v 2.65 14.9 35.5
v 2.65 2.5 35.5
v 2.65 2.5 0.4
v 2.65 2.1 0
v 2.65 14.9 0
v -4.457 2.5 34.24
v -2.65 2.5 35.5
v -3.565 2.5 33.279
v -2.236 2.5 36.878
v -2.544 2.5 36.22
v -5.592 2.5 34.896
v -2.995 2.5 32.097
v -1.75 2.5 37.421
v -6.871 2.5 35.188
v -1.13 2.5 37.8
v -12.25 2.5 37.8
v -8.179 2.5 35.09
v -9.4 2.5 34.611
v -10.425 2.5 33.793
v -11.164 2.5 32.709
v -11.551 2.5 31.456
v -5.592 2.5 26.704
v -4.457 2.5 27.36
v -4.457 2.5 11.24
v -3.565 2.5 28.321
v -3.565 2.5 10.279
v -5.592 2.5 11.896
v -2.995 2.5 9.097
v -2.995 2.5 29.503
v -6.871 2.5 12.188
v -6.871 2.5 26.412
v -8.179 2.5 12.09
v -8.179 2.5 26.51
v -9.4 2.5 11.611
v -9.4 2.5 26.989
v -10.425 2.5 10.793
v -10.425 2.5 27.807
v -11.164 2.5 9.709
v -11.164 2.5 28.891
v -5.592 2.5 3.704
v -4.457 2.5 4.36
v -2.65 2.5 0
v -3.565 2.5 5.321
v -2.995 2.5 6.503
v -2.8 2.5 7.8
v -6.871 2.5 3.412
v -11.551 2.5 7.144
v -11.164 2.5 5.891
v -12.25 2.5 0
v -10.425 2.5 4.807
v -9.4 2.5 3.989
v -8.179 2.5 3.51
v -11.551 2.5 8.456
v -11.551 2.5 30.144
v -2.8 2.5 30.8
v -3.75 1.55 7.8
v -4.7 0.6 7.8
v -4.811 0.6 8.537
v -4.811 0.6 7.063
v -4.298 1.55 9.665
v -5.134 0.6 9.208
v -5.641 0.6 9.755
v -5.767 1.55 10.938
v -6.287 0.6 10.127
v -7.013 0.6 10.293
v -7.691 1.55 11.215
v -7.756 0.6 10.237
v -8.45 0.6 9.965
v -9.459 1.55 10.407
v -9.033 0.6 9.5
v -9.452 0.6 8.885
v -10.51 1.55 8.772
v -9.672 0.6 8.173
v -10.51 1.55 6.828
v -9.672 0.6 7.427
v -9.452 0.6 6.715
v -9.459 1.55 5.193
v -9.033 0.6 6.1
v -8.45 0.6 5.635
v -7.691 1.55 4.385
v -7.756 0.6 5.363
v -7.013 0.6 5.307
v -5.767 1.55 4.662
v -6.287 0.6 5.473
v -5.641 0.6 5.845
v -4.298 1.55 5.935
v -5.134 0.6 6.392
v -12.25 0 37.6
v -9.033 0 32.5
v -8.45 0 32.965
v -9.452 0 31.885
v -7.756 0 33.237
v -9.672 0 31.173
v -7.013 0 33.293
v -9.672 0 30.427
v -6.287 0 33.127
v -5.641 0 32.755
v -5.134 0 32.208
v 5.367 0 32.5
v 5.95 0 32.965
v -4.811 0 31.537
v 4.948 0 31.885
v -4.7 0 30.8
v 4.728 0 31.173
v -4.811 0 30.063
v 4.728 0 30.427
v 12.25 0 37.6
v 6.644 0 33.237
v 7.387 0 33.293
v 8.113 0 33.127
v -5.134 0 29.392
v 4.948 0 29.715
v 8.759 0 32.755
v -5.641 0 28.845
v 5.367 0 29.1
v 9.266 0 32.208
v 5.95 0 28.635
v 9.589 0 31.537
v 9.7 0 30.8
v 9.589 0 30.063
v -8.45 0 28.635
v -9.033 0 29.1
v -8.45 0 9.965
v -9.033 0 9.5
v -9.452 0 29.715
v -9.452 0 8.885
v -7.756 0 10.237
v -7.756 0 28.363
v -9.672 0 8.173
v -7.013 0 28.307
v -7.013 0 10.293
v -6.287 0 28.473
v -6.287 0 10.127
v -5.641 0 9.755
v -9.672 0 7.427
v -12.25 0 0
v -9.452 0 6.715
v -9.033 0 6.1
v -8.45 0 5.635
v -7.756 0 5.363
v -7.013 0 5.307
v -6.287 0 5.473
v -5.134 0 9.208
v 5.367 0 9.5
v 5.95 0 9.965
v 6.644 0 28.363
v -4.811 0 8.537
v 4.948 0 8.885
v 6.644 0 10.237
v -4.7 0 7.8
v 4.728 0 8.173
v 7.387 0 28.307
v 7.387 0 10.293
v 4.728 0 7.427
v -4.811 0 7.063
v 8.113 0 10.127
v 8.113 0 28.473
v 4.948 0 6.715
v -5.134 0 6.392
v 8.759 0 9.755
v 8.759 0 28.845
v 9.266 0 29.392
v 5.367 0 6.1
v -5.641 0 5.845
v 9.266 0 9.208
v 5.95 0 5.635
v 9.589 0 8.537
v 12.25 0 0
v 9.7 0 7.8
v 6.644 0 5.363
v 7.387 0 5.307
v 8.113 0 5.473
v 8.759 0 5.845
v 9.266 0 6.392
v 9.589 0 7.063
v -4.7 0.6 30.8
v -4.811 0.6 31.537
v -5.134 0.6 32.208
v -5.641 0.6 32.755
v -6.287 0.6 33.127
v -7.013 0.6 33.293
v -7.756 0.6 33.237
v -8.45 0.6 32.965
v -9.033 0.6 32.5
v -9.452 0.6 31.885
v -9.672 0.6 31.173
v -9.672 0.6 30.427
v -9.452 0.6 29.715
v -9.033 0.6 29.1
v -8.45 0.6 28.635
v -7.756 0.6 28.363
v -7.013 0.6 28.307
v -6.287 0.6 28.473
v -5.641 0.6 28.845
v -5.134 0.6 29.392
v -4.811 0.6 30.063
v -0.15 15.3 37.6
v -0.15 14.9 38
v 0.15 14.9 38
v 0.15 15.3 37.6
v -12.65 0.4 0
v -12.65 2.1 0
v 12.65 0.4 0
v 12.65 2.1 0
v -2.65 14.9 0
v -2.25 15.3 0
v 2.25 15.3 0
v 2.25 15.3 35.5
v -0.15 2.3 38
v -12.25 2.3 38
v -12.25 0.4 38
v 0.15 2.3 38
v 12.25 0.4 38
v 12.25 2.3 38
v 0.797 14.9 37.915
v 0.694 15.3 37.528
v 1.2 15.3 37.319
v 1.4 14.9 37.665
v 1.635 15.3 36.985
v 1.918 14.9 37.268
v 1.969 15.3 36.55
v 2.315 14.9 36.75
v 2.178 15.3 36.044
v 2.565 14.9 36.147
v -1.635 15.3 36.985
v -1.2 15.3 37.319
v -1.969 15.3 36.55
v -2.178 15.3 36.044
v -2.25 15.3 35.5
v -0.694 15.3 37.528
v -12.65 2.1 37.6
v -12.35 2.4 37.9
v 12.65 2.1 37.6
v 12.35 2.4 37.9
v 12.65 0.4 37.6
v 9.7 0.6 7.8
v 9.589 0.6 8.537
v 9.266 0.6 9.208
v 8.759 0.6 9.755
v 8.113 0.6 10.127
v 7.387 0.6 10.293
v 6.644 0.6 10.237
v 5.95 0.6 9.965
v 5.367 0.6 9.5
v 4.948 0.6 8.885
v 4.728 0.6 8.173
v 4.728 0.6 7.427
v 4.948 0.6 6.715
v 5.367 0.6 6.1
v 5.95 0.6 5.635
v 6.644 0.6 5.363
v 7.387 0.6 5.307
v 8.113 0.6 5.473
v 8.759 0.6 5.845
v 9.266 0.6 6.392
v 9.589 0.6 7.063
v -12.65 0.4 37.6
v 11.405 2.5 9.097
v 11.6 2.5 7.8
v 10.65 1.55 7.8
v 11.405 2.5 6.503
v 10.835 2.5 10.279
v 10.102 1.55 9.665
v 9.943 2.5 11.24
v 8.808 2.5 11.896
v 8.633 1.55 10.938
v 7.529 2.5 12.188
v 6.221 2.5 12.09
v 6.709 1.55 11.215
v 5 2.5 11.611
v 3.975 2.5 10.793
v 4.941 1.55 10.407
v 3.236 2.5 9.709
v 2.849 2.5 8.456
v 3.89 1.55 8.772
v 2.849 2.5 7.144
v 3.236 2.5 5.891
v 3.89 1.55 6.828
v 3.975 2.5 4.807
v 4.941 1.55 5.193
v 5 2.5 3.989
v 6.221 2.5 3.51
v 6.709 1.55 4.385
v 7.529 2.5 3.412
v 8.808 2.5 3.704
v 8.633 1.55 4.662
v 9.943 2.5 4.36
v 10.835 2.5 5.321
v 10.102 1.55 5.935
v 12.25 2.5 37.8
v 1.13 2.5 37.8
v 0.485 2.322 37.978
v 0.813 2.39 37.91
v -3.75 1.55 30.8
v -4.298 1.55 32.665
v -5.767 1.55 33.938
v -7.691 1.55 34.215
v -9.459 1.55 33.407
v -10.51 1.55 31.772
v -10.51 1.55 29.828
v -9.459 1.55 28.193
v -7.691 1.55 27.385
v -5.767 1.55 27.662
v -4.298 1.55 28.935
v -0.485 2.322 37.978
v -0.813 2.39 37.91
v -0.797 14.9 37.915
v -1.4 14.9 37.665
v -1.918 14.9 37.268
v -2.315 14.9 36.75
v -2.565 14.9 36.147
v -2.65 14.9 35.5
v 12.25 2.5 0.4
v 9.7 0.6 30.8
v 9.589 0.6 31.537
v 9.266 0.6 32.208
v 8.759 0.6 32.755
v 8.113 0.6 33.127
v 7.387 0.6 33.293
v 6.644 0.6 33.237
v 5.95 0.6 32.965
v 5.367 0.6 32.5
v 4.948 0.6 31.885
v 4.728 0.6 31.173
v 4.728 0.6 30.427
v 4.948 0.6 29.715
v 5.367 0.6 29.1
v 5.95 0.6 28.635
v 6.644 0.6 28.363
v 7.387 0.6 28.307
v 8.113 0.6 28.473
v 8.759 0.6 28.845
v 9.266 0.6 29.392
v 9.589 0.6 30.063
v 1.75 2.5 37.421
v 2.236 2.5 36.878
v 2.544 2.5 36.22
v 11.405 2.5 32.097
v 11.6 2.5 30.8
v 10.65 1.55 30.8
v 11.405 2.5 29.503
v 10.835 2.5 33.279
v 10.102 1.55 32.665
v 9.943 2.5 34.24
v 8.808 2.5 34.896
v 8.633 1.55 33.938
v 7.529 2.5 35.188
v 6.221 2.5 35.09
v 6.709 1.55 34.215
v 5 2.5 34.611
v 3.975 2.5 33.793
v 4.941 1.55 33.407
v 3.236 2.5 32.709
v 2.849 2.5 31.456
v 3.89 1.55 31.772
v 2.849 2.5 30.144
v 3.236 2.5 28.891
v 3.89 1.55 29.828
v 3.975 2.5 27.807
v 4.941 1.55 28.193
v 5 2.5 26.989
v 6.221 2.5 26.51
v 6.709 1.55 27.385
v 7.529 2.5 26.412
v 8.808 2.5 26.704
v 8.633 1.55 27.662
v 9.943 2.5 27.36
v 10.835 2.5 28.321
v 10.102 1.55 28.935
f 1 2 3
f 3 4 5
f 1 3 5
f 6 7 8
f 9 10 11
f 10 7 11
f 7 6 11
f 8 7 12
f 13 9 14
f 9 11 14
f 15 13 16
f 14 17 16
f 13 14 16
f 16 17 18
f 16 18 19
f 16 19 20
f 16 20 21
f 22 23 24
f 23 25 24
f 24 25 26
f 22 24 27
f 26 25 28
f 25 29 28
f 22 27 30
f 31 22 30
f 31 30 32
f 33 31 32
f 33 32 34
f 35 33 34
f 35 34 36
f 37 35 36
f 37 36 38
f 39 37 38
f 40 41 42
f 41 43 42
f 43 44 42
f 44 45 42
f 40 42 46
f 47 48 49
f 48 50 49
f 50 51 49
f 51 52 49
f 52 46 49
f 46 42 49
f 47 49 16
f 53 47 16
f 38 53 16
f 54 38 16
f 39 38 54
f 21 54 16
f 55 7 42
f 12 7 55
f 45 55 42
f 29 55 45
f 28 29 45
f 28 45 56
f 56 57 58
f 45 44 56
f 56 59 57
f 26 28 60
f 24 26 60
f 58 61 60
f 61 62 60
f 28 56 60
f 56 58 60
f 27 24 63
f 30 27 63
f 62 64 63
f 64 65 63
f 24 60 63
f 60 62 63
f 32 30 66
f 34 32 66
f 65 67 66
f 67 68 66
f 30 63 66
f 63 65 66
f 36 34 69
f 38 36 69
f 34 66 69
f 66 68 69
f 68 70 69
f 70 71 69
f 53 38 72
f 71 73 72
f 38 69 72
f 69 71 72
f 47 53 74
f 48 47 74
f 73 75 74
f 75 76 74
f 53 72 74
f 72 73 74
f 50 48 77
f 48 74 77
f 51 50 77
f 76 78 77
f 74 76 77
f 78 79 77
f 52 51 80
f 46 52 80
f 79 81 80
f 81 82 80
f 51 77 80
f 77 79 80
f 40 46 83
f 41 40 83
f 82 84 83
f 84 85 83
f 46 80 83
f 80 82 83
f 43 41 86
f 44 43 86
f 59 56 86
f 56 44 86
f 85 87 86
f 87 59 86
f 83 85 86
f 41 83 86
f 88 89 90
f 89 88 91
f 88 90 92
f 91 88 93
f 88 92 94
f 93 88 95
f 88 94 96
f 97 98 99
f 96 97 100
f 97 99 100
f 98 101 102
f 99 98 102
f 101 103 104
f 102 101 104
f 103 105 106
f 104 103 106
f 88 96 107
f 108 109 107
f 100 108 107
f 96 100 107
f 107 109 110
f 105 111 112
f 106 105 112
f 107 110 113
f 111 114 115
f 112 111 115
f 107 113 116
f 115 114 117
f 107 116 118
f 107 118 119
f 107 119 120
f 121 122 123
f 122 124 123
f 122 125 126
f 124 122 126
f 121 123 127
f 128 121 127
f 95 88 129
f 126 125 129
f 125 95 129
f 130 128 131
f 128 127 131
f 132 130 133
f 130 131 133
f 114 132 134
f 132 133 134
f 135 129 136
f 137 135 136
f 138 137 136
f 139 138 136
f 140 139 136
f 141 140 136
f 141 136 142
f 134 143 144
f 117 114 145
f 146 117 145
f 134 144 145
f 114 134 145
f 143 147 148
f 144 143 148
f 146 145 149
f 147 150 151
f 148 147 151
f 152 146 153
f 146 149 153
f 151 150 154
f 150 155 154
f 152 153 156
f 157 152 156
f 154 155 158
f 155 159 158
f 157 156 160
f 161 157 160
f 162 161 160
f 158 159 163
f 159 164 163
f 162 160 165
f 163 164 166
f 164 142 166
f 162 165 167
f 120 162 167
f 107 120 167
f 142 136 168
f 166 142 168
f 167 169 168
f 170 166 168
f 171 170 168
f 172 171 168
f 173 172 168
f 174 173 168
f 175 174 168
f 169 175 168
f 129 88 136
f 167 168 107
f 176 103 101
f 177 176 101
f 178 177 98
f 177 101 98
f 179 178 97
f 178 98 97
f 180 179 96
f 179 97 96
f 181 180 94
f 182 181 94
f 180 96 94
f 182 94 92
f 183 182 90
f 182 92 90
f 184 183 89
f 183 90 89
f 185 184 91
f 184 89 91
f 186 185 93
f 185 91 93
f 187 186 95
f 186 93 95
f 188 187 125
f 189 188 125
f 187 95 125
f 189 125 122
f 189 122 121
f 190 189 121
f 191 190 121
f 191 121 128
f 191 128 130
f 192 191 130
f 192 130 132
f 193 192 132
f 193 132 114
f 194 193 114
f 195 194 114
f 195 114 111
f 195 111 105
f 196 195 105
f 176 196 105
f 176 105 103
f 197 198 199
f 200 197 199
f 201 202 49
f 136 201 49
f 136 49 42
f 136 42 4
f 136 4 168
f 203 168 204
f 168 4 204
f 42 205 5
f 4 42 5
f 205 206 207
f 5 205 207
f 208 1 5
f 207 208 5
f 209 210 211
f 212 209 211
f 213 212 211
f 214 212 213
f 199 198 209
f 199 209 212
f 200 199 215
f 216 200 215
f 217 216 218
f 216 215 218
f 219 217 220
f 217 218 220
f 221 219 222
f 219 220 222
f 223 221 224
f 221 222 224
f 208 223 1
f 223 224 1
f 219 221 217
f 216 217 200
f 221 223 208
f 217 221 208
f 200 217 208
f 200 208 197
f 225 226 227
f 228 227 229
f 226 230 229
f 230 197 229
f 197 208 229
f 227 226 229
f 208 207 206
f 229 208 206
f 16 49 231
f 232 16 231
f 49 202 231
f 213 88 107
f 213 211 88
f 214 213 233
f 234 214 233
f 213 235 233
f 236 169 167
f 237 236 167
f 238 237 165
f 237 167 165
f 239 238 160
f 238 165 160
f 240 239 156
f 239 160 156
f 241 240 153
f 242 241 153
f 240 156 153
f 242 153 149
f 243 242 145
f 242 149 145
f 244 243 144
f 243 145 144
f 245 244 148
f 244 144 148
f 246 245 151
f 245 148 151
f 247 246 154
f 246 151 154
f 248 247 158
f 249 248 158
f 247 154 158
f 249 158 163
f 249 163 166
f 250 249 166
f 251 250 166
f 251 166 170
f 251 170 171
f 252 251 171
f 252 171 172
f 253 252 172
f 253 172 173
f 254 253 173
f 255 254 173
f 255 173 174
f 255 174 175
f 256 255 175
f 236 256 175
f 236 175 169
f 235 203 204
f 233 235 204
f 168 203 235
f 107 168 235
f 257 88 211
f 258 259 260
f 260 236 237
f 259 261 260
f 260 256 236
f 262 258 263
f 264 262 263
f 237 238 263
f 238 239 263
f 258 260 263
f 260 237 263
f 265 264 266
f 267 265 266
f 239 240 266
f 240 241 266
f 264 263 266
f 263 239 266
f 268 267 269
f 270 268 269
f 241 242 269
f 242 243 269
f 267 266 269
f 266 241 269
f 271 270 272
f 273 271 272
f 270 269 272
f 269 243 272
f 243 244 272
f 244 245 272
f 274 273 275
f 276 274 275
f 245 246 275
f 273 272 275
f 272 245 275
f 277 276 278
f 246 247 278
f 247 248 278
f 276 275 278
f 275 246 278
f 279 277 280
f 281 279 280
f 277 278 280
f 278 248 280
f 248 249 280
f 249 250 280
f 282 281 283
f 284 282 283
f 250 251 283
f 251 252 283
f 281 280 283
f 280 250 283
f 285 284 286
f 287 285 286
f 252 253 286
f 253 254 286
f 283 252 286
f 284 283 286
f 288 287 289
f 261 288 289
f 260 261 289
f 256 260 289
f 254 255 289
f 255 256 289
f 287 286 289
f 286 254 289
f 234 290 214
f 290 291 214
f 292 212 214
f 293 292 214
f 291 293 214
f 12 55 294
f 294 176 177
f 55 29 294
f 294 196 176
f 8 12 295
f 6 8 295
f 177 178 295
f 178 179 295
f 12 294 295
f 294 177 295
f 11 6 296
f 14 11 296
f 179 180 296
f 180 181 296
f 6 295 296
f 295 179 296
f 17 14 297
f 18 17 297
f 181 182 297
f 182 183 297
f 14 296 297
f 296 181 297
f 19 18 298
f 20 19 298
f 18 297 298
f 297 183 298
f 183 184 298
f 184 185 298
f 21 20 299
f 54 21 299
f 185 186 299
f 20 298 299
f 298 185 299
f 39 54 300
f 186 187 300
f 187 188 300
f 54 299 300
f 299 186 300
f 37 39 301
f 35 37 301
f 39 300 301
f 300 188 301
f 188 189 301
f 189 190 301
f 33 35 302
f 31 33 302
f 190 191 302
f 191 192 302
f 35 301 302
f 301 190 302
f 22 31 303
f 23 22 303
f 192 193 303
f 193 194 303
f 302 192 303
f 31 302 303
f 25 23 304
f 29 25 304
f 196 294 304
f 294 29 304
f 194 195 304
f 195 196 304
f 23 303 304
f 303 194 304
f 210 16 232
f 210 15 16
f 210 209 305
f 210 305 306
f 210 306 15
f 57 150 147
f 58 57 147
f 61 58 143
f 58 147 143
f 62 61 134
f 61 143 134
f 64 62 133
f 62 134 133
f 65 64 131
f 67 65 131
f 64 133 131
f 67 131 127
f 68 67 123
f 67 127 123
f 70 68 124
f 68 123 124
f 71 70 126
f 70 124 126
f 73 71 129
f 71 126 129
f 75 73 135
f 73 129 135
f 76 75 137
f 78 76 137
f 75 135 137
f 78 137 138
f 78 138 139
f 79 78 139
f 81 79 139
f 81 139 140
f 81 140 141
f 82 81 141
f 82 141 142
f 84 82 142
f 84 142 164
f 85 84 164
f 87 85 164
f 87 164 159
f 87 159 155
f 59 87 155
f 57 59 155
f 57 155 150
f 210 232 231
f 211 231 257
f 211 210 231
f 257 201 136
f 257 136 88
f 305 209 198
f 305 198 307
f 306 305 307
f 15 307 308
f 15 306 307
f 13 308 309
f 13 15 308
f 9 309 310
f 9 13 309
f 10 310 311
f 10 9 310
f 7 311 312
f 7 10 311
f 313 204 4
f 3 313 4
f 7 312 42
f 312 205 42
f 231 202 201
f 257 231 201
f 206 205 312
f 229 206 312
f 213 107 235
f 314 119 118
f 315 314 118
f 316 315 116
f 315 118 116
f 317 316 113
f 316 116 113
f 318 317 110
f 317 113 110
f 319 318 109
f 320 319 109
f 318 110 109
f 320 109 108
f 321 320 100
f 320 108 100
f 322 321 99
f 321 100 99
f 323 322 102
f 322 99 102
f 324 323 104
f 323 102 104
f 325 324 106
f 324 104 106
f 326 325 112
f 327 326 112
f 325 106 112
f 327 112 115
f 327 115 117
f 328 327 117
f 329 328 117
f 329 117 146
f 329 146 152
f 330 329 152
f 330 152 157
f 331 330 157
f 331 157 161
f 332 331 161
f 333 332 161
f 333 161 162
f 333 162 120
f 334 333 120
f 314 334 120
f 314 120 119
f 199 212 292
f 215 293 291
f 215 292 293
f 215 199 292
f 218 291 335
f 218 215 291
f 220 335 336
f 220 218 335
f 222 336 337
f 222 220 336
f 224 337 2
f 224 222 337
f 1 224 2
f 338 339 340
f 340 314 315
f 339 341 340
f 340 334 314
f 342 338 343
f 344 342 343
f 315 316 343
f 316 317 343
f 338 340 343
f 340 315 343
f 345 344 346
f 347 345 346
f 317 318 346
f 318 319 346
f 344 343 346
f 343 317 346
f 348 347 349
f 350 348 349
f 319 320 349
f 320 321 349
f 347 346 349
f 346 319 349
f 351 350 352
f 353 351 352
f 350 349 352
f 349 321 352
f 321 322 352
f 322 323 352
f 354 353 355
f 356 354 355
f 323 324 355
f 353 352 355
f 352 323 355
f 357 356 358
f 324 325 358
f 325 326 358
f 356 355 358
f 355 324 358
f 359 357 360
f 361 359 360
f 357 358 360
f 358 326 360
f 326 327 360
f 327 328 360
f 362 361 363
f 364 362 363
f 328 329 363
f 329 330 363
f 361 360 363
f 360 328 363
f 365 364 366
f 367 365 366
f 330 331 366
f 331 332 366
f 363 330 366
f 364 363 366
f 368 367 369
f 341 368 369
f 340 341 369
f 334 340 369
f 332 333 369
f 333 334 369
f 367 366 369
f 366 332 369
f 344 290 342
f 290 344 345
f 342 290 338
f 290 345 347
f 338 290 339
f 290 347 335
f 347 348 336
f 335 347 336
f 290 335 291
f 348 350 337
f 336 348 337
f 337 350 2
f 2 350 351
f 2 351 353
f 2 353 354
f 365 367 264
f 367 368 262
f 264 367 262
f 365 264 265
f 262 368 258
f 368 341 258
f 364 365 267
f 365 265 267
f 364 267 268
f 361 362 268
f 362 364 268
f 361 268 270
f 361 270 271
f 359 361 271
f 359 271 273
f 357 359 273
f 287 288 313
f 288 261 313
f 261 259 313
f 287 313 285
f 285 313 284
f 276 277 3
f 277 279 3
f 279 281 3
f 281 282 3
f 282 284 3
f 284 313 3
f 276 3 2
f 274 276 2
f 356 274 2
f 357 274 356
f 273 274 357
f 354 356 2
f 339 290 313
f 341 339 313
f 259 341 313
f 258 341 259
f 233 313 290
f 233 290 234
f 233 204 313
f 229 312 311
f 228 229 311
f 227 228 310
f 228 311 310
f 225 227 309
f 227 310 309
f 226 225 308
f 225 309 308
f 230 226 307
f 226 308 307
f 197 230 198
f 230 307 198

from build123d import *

# Parameters (mm, degrees)
F1_DEPTH = 38
F2_R     = 2.5
F3_DEPTH = 25
F4_SIZE  = 1.9
F5_R     = 2.5
F6_SIZE  = 0.4
F7_SIZE  = 0.2


with BuildPart() as f1:
    # F0 (on Top) → F1 (new body)
    with BuildSketch(Plane.XY):
        Polygon((2.65, 15.3), (0, 15.3), (-2.65, 15.3), (-2.65, 2.5), (-12.65, 2.5), (-12.65, 0), (0, 0), (12.65, 0), (12.65, 2.5), (2.65, 2.5), align=None)
    extrude(amount=F1_DEPTH)

    # F2 (on Front) → F3 (cut)
    with BuildSketch(Plane.XZ):
        with Locations((-7.2, 30.8)):
            Circle(F2_R)
        with Locations((-7.2, 7.8)):
            Circle(F2_R)
        with Locations((7.2, 7.8)):
            Circle(F2_R)
        with Locations((7.2, 30.8)):
            Circle(F2_R)
    extrude(amount=-F3_DEPTH, mode=Mode.SUBTRACT)

    # F4
    f4_edges = [f1.edges().sort_by_distance(p)[0] for p in [
        (4.7, 2.5, 7.8),
        (4.7, 2.5, 30.8),
        (-9.7, 2.5, 7.8),
        (-9.7, 2.5, 30.8),
    ]]
    chamfer(f4_edges, length=F4_SIZE)

    # F5
    f5_edges = [f1.edges().sort_by_distance(p)[0] for p in [
        (-2.65, 8.9, 38),
        (2.65, 8.9, 38),
    ]]
    fillet(f5_edges, radius=F5_R)

    # F6
    f6_edges = [f1.edges().sort_by_distance(p)[0] for p in [
        (-2.65, 15.3, 17.75),
        (2.65, 15.3, 17.75),
        (7.65, 2.5, 0),
        (12.65, 2.5, 19),
        (0, 0, 38),
        (12.65, 0, 19),
        (-12.65, 2.5, 19),
        (-12.65, 0, 19),
        (-12.65, 1.25, 38),
        (12.65, 1.25, 38),
    ]]
    chamfer(f6_edges, length=F6_SIZE)

    # F7
    f7_edges = [f1.edges().sort_by_distance(p)[0] for p in [
        (7.45, 2.5, 38),
        (-7.45, 2.5, 38),
    ]]
    chamfer(f7_edges, length=F7_SIZE)


solid = f1.part
